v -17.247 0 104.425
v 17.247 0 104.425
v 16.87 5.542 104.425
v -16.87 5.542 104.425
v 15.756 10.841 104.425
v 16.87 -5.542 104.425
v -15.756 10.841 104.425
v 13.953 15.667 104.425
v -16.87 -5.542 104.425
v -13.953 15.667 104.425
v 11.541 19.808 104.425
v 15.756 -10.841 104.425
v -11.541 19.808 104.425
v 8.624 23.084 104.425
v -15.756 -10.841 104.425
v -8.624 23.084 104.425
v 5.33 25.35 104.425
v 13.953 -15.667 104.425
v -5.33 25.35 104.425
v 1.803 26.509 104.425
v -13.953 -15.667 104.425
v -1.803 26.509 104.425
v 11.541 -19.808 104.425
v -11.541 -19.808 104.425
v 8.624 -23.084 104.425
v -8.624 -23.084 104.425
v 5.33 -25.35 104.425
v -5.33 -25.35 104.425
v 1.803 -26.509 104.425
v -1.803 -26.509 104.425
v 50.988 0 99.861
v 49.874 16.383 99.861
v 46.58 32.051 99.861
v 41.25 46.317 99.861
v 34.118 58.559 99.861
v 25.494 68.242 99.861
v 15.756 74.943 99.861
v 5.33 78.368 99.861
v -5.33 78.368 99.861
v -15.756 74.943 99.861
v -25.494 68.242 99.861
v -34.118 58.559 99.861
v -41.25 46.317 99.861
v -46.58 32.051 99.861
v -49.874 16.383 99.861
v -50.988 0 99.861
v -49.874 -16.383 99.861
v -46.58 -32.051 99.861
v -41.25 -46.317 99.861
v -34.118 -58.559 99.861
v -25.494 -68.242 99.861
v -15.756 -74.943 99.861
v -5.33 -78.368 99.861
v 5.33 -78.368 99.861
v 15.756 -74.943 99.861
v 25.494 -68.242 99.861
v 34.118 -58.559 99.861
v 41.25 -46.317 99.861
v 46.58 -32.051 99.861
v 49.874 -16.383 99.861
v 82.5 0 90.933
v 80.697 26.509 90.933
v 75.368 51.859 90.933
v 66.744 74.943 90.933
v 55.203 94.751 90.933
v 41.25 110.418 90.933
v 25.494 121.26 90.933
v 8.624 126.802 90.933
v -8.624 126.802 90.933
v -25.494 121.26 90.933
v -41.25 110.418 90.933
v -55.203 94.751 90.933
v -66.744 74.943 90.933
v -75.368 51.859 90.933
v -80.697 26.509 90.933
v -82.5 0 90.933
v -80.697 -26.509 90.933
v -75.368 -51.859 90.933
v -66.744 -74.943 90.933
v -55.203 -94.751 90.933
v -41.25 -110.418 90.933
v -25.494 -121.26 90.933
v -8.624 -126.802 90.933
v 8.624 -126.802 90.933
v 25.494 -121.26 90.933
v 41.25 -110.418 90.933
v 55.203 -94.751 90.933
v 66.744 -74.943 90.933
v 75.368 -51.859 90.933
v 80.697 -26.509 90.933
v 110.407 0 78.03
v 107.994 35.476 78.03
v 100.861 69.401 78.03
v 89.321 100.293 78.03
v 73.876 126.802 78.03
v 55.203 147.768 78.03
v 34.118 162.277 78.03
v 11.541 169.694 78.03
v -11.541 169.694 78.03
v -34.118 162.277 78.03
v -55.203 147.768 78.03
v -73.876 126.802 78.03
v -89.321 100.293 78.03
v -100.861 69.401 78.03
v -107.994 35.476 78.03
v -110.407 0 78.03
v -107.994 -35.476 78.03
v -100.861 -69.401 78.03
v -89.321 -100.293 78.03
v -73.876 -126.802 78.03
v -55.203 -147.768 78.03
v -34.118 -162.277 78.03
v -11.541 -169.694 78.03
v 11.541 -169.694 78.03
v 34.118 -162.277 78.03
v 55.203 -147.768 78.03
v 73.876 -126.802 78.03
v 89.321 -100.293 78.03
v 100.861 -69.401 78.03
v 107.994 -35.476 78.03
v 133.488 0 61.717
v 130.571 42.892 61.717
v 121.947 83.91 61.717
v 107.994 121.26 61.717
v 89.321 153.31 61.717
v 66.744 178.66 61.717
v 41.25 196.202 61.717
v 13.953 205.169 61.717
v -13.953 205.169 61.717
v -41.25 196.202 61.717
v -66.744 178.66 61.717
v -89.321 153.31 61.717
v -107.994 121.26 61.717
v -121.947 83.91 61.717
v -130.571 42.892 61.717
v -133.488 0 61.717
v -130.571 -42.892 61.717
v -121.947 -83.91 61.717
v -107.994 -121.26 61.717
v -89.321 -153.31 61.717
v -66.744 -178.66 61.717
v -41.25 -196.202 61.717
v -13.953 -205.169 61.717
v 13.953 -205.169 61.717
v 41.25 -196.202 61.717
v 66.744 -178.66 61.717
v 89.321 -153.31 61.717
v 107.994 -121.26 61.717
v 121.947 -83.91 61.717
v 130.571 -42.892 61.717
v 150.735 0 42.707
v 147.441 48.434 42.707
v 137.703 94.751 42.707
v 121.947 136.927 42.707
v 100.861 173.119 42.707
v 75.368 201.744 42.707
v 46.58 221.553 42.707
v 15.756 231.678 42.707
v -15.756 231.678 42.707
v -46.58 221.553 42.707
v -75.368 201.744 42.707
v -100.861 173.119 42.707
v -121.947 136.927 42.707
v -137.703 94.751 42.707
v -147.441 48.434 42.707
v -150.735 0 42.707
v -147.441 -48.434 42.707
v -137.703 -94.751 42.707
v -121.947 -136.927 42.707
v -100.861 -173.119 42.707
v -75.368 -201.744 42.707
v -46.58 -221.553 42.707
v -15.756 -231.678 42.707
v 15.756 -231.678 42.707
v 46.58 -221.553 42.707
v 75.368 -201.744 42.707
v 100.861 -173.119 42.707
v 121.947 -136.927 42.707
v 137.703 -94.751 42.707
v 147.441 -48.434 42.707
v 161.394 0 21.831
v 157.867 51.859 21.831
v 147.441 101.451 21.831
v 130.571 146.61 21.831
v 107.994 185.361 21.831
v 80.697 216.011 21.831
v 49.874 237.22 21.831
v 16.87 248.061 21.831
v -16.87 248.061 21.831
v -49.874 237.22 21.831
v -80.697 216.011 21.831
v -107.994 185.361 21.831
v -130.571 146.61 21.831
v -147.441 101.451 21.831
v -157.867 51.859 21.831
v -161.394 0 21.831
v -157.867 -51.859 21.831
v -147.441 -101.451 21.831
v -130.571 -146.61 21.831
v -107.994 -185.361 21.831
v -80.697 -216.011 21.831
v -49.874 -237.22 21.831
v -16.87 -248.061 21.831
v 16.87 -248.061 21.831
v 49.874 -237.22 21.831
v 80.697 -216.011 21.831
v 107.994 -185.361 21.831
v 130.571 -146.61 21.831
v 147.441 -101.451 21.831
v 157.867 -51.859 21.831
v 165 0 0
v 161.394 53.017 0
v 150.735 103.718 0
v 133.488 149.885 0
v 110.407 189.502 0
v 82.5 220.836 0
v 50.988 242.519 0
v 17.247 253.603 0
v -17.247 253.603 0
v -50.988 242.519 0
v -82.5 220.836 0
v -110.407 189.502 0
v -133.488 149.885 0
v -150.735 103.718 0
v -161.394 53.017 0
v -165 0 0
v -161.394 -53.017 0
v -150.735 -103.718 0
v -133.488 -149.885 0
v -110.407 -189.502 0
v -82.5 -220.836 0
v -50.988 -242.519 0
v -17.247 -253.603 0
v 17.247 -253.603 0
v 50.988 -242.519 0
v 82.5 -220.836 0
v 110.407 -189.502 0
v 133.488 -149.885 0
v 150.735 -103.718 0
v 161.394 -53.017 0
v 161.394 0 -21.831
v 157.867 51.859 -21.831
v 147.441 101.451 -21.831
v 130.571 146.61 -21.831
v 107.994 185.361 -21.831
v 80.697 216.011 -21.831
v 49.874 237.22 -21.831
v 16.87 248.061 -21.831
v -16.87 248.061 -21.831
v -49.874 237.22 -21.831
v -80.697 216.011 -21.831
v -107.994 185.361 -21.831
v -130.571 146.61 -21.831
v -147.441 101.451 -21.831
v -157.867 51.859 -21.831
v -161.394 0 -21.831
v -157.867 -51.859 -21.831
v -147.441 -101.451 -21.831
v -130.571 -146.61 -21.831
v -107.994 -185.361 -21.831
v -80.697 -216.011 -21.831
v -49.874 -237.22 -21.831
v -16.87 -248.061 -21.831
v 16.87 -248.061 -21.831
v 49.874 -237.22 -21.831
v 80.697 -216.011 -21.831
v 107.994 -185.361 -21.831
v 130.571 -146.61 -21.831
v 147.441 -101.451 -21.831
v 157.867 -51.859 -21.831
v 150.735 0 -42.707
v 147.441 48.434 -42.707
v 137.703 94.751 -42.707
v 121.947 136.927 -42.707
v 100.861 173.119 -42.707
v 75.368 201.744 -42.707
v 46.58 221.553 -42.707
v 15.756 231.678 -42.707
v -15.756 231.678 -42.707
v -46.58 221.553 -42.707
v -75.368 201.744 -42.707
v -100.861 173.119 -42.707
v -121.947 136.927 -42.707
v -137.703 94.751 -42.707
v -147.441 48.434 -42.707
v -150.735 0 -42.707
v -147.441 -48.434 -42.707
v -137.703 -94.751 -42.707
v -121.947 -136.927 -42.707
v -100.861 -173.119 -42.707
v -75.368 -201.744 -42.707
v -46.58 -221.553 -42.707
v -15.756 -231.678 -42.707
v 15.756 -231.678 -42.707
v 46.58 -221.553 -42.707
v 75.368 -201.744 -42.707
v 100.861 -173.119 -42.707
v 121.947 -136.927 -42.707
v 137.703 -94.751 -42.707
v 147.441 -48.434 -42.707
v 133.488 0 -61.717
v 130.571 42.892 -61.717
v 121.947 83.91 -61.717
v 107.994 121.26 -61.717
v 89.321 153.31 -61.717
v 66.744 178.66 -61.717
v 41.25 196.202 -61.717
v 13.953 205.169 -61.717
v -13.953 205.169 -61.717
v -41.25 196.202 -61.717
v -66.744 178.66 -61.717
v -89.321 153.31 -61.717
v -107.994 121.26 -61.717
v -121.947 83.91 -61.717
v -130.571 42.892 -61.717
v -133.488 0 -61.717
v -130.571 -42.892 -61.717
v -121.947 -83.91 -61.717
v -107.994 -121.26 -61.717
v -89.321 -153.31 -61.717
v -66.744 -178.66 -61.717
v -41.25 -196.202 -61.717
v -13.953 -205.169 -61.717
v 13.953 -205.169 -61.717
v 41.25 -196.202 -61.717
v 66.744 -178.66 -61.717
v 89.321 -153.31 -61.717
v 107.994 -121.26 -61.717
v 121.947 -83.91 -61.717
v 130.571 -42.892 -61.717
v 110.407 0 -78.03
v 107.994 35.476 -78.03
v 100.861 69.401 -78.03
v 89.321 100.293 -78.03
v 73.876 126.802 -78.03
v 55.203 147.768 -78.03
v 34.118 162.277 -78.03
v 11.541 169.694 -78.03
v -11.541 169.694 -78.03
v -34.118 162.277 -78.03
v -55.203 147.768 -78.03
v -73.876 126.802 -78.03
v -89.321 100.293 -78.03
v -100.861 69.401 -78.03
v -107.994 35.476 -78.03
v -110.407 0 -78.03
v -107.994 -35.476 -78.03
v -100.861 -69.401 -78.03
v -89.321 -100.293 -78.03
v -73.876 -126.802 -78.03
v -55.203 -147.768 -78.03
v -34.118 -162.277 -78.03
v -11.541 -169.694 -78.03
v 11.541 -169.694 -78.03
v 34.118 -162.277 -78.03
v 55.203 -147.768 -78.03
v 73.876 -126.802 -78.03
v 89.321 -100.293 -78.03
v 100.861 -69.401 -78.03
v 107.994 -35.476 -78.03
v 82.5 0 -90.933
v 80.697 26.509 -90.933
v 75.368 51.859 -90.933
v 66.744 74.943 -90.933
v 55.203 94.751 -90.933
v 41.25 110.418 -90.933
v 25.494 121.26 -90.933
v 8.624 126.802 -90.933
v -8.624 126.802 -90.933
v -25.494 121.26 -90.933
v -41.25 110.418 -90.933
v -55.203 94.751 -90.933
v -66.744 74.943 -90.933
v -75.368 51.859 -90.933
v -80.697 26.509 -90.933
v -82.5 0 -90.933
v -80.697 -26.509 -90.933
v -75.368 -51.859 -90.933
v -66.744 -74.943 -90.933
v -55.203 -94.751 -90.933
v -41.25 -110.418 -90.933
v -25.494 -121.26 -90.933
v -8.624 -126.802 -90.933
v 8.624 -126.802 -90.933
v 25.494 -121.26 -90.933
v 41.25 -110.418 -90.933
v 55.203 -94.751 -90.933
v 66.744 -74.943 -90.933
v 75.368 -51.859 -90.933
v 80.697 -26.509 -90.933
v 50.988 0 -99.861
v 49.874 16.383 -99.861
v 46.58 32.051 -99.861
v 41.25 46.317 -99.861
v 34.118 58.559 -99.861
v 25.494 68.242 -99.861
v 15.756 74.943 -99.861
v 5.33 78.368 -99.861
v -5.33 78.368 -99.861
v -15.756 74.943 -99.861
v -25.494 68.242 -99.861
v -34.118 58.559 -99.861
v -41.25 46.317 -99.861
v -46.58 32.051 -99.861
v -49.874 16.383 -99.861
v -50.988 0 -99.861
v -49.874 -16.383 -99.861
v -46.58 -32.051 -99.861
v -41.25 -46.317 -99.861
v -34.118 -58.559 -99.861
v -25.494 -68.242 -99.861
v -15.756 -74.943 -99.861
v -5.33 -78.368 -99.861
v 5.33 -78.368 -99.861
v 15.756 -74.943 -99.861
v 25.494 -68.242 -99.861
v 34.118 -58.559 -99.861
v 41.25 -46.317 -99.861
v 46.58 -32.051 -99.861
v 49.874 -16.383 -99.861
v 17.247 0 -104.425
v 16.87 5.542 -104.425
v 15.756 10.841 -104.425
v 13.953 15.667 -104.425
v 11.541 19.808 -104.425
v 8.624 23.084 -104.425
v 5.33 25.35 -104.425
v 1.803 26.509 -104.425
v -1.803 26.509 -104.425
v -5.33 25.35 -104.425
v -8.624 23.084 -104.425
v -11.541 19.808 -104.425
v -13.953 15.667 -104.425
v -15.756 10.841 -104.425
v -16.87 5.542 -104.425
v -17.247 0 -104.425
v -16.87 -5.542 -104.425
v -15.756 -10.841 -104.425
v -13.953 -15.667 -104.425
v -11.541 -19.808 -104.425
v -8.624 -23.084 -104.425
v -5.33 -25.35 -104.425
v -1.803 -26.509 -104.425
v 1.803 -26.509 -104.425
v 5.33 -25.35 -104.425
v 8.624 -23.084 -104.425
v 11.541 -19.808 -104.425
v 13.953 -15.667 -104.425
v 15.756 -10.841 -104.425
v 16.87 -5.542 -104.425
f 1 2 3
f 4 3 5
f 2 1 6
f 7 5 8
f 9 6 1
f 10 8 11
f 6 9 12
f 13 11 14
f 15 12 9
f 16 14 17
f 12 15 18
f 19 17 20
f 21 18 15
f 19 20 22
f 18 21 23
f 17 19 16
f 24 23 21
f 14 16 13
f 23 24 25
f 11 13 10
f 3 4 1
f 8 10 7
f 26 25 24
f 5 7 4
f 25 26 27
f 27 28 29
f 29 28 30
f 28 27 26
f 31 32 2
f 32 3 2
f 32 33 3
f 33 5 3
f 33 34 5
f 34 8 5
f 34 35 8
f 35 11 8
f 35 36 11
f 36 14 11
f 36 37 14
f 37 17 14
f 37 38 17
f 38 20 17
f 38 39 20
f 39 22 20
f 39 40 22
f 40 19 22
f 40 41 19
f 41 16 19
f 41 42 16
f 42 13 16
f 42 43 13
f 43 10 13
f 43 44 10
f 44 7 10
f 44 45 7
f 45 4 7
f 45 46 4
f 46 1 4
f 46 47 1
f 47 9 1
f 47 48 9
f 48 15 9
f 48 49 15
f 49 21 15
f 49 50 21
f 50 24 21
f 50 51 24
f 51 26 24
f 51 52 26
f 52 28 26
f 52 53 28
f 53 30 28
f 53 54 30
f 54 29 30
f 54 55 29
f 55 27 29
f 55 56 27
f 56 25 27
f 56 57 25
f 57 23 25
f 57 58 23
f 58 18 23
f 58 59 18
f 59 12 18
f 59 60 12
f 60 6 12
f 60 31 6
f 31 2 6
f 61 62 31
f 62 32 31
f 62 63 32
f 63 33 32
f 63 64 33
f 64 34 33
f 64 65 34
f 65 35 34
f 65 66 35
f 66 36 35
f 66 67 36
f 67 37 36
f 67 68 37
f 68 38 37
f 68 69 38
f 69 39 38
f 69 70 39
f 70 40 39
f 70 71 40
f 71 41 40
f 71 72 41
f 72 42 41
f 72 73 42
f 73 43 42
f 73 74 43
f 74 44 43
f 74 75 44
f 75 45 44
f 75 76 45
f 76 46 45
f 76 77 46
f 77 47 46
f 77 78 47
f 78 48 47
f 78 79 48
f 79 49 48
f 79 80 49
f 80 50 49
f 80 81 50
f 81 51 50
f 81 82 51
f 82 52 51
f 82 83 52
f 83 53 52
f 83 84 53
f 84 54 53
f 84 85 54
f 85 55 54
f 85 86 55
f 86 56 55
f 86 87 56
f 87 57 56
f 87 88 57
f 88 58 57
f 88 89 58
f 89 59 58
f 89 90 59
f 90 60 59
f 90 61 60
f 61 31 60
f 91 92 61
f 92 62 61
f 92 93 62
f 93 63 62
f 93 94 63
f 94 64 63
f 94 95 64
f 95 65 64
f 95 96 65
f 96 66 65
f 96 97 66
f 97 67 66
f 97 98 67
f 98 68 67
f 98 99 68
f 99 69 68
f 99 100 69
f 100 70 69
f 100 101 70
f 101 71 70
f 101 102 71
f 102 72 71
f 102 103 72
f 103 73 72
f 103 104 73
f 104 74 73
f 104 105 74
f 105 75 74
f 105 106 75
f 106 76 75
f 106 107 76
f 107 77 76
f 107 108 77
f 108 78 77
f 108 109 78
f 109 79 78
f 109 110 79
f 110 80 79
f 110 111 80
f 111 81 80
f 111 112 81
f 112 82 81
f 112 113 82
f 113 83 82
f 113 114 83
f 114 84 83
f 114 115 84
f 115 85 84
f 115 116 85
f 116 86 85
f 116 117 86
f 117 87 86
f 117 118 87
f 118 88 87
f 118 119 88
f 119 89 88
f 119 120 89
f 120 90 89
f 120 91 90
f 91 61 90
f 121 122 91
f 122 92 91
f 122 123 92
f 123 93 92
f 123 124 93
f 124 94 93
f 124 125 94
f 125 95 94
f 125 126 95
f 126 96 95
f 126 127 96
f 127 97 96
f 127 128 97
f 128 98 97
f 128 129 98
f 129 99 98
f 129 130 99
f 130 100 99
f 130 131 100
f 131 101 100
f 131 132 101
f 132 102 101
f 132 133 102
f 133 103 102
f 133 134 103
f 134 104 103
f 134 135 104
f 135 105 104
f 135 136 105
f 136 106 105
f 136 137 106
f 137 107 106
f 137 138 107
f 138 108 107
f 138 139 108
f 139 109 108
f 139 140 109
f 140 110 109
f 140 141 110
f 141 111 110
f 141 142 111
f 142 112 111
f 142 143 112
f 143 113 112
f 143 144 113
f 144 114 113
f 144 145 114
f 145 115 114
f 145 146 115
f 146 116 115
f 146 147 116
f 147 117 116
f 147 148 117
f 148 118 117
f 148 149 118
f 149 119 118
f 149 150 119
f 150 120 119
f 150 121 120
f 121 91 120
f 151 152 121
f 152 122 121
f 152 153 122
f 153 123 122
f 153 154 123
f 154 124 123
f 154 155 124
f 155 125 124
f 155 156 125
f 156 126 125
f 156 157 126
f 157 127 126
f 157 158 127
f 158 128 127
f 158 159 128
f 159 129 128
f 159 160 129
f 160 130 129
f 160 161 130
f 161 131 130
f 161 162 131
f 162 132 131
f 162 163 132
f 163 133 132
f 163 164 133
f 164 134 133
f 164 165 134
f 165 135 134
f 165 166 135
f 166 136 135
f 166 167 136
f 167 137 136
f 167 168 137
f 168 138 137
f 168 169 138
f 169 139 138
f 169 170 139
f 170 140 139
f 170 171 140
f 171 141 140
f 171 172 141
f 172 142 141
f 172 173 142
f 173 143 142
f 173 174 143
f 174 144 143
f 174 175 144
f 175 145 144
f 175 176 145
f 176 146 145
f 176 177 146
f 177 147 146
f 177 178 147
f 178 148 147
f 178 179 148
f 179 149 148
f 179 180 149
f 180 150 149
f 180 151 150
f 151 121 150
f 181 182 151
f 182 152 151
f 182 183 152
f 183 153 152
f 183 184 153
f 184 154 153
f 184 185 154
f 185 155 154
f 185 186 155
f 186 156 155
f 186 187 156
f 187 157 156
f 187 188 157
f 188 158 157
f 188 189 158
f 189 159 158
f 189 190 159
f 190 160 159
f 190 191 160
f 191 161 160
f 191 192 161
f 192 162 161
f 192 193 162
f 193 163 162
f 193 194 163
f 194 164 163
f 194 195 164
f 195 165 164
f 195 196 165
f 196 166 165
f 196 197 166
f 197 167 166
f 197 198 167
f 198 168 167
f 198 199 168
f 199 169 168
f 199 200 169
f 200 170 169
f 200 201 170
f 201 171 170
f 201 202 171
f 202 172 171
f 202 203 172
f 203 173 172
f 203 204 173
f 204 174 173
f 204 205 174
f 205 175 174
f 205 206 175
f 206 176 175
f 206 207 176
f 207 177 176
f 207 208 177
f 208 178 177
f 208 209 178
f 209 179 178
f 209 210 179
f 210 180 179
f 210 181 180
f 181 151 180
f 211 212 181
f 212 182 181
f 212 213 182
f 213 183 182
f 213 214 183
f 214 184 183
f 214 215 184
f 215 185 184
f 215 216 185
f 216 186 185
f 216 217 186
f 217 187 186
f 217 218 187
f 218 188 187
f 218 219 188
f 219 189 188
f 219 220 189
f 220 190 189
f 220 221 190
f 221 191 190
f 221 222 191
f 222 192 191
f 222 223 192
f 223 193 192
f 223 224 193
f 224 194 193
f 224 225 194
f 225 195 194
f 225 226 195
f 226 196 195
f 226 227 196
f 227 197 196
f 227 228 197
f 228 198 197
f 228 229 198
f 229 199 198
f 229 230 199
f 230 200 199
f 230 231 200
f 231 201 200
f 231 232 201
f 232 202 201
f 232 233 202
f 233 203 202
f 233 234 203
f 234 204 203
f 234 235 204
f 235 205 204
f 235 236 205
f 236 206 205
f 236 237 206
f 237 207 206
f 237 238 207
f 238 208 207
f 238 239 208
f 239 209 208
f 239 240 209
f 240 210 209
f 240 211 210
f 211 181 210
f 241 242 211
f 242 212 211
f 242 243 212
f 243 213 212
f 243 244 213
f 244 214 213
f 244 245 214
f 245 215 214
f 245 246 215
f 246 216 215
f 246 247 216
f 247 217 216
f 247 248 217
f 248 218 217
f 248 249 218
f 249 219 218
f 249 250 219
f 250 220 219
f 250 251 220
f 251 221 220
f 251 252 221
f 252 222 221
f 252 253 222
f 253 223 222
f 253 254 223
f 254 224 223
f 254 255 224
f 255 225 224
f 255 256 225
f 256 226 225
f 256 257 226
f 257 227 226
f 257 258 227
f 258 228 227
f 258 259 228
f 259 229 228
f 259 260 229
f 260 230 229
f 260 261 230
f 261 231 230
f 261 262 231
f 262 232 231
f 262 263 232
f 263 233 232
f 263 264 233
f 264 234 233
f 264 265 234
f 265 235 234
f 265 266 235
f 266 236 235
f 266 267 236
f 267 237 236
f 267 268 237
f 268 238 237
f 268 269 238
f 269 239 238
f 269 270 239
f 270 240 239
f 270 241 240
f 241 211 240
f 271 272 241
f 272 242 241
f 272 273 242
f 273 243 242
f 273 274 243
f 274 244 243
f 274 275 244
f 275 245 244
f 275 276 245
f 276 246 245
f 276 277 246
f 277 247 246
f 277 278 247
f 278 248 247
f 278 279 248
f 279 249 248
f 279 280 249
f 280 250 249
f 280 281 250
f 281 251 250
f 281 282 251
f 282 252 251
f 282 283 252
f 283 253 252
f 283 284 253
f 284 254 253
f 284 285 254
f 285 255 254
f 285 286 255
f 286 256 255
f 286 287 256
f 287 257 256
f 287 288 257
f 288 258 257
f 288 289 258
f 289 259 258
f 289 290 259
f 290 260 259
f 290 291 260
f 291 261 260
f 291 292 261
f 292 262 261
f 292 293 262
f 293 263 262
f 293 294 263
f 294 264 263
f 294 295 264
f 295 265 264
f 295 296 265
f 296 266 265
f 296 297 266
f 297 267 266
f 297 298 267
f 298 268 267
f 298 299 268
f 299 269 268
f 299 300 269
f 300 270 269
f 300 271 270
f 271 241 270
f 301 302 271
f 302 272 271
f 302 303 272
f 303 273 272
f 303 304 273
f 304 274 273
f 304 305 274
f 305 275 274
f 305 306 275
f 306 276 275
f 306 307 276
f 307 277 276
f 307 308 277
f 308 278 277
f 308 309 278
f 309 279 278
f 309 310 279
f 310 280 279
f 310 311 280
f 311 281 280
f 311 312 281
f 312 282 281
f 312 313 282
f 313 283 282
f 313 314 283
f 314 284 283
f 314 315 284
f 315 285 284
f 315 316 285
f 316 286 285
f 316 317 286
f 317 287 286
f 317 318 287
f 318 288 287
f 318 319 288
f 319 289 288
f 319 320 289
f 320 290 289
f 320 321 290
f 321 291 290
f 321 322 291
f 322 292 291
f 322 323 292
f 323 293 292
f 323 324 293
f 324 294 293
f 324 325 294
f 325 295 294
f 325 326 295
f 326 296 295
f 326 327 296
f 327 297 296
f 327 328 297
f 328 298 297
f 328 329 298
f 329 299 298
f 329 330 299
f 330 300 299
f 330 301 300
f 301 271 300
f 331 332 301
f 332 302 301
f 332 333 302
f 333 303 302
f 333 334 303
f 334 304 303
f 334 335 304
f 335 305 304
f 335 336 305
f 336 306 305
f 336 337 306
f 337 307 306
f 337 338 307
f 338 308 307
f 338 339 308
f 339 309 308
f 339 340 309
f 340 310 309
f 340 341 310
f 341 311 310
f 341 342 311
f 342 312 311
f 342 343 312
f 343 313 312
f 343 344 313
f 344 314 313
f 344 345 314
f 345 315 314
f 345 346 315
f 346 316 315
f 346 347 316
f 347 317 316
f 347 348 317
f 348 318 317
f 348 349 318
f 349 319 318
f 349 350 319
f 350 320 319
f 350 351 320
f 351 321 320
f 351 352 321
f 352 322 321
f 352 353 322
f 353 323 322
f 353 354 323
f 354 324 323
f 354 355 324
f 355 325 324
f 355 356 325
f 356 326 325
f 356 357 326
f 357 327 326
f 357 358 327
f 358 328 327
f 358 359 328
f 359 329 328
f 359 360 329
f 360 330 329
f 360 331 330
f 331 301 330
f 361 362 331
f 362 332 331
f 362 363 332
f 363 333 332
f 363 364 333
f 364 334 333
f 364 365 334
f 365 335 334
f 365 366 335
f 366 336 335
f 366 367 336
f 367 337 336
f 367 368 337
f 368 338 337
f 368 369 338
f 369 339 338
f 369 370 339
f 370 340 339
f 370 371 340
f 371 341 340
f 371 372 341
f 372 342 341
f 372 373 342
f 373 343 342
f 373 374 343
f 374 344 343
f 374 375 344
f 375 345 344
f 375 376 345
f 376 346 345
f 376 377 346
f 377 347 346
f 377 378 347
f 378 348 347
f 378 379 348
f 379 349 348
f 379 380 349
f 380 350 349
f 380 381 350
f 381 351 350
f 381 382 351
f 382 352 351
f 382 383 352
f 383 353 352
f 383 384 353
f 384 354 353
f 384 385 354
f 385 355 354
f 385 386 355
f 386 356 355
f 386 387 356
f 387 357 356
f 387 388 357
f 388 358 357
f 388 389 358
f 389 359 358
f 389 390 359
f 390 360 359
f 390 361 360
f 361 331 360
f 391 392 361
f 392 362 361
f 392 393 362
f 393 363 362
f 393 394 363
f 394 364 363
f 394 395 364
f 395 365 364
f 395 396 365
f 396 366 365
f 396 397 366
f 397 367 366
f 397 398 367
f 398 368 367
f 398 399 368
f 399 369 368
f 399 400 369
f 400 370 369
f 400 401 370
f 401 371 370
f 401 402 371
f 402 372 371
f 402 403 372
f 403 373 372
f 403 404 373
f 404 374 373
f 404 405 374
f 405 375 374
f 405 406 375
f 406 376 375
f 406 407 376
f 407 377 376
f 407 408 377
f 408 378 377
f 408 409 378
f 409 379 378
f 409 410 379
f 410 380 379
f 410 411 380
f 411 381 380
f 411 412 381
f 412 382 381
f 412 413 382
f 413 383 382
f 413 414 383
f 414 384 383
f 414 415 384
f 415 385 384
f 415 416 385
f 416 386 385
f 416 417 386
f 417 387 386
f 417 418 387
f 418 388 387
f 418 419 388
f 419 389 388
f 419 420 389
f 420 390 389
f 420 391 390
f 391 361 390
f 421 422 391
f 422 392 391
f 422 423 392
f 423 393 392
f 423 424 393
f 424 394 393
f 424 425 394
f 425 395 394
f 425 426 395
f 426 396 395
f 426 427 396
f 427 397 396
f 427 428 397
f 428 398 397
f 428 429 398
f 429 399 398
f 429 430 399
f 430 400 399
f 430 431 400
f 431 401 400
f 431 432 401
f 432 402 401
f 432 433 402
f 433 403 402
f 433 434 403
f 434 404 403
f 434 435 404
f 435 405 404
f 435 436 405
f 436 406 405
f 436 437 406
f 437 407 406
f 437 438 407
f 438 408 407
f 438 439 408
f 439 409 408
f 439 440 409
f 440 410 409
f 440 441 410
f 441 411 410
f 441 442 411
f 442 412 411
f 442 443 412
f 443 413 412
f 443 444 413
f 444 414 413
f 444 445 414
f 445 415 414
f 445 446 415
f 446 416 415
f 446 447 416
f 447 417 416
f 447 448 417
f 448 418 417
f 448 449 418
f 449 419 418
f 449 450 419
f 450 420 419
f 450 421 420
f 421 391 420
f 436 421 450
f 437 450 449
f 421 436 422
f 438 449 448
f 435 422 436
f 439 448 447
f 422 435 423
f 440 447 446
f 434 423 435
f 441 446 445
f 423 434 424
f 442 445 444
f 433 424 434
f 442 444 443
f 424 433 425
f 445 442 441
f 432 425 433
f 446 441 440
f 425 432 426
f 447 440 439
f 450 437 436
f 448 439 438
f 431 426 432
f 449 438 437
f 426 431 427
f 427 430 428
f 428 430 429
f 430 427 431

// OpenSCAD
// Generated by SolidPython 1.0.1 on 2020-07-29 00:46:50


scale(v = [11, 17, 7]) {
	sphere(r = 15);
}
/***********************************************
*********      SolidPython code:      **********
************************************************
 
# import packages: SolidPython
from solid import *
from solid.utils import *
from itertools import chain, combinations, permutations


class Resize:

    def __init__(self, scad_file):
        self.scad_file = scad_file
        #self.scad_file = import_scad(scad_file)
        # cone/cylinder param:
        self.r1 = 0
        self.r2 = 0
        self.h = 0
        # rectangular prism param:
        self.w = 0
        self.l = 0
        # ellipse param:
        self.r = 0

    # import OpenScad code (file name corresponds to shape)


    # classify shape + parameters
    def assign(self, param1, param2, param3):
        if self.scad_file == 'cone.scad':
            self.r1 = param1
            self.r2 = param2
            self.h = param3
        elif self.scad_file == 'cylinder.scad':
            self.r1 = param1
            self.r2 = param2
            self.h = param3
        elif self.scad_file == 'rectangularPrism.scad':
            self.h = param1
            self.l = param2
            self.w = param3
        else:
            self.r = param1
            self.h = param2

    # resize parameters
    def iterate(self):
        x = range(3, 20, 2)
        i = 1
        if self.scad_file == 'cone.scad':
            tempList = list(permutations(x, 2))
            for temp in tempList:
                param1 = temp[0]
                param2 = temp[1]
                filepath = 'produced_scad_files/' + 'cone' + str(param1) + '_' + str(param2) + '_' + '.scad'
                scad_render_to_file(cylinder(h=param1, r1=param2, r2=0), filepath)

        elif self.scad_file == 'cylinder.scad':
            tempList = list(permutations(x, 3))
            for temp in tempList:
                param1 = temp[0]
                param2 = temp[1]
                filepath = 'produced_scad_files/' + 'cylinder' + str(param1) + '_' + str(param2) + '_' + '.scad'
                scad_render_to_file(cylinder(h=param1, r1=param2, r2=param2), filepath)

        elif self.scad_file == 'rectangularPrism.scad':
            tempList = list(permutations(x, 3))
            for temp in tempList:
                param1 = temp[0]
                param2 = temp[1]
                param3 = temp[2]
                filepath = 'produced_scad_files/' + 'rectangularPrism' + str(param1) + '_' + str(param2) + '_' + str(
                    param3) + '.scad'
                scad_render_to_file(cube(size=(param1, param2, param3)), filepath)

        elif self.scad_file == 'ellipse.scad':
            tempList = list(permutations(x, 4))
            for temp in tempList:
                param1 = temp[0]
                param2 = temp[1]
                param3 = temp[2]
                param4 = temp[3]
                filepath = 'produced_scad_files/' + 'ellipse' + str(param1) + '_' + str(param2) + '_' + str(param3) + '_' + str(param4) + '.scad'
                scad_render_to_file(scale([param1, param2, param3])(sphere(r=param4)), filepath)

    def render_to_scadfile(self):
        scad_render_to_file(scad, 'example.scad') 
 
************************************************/
